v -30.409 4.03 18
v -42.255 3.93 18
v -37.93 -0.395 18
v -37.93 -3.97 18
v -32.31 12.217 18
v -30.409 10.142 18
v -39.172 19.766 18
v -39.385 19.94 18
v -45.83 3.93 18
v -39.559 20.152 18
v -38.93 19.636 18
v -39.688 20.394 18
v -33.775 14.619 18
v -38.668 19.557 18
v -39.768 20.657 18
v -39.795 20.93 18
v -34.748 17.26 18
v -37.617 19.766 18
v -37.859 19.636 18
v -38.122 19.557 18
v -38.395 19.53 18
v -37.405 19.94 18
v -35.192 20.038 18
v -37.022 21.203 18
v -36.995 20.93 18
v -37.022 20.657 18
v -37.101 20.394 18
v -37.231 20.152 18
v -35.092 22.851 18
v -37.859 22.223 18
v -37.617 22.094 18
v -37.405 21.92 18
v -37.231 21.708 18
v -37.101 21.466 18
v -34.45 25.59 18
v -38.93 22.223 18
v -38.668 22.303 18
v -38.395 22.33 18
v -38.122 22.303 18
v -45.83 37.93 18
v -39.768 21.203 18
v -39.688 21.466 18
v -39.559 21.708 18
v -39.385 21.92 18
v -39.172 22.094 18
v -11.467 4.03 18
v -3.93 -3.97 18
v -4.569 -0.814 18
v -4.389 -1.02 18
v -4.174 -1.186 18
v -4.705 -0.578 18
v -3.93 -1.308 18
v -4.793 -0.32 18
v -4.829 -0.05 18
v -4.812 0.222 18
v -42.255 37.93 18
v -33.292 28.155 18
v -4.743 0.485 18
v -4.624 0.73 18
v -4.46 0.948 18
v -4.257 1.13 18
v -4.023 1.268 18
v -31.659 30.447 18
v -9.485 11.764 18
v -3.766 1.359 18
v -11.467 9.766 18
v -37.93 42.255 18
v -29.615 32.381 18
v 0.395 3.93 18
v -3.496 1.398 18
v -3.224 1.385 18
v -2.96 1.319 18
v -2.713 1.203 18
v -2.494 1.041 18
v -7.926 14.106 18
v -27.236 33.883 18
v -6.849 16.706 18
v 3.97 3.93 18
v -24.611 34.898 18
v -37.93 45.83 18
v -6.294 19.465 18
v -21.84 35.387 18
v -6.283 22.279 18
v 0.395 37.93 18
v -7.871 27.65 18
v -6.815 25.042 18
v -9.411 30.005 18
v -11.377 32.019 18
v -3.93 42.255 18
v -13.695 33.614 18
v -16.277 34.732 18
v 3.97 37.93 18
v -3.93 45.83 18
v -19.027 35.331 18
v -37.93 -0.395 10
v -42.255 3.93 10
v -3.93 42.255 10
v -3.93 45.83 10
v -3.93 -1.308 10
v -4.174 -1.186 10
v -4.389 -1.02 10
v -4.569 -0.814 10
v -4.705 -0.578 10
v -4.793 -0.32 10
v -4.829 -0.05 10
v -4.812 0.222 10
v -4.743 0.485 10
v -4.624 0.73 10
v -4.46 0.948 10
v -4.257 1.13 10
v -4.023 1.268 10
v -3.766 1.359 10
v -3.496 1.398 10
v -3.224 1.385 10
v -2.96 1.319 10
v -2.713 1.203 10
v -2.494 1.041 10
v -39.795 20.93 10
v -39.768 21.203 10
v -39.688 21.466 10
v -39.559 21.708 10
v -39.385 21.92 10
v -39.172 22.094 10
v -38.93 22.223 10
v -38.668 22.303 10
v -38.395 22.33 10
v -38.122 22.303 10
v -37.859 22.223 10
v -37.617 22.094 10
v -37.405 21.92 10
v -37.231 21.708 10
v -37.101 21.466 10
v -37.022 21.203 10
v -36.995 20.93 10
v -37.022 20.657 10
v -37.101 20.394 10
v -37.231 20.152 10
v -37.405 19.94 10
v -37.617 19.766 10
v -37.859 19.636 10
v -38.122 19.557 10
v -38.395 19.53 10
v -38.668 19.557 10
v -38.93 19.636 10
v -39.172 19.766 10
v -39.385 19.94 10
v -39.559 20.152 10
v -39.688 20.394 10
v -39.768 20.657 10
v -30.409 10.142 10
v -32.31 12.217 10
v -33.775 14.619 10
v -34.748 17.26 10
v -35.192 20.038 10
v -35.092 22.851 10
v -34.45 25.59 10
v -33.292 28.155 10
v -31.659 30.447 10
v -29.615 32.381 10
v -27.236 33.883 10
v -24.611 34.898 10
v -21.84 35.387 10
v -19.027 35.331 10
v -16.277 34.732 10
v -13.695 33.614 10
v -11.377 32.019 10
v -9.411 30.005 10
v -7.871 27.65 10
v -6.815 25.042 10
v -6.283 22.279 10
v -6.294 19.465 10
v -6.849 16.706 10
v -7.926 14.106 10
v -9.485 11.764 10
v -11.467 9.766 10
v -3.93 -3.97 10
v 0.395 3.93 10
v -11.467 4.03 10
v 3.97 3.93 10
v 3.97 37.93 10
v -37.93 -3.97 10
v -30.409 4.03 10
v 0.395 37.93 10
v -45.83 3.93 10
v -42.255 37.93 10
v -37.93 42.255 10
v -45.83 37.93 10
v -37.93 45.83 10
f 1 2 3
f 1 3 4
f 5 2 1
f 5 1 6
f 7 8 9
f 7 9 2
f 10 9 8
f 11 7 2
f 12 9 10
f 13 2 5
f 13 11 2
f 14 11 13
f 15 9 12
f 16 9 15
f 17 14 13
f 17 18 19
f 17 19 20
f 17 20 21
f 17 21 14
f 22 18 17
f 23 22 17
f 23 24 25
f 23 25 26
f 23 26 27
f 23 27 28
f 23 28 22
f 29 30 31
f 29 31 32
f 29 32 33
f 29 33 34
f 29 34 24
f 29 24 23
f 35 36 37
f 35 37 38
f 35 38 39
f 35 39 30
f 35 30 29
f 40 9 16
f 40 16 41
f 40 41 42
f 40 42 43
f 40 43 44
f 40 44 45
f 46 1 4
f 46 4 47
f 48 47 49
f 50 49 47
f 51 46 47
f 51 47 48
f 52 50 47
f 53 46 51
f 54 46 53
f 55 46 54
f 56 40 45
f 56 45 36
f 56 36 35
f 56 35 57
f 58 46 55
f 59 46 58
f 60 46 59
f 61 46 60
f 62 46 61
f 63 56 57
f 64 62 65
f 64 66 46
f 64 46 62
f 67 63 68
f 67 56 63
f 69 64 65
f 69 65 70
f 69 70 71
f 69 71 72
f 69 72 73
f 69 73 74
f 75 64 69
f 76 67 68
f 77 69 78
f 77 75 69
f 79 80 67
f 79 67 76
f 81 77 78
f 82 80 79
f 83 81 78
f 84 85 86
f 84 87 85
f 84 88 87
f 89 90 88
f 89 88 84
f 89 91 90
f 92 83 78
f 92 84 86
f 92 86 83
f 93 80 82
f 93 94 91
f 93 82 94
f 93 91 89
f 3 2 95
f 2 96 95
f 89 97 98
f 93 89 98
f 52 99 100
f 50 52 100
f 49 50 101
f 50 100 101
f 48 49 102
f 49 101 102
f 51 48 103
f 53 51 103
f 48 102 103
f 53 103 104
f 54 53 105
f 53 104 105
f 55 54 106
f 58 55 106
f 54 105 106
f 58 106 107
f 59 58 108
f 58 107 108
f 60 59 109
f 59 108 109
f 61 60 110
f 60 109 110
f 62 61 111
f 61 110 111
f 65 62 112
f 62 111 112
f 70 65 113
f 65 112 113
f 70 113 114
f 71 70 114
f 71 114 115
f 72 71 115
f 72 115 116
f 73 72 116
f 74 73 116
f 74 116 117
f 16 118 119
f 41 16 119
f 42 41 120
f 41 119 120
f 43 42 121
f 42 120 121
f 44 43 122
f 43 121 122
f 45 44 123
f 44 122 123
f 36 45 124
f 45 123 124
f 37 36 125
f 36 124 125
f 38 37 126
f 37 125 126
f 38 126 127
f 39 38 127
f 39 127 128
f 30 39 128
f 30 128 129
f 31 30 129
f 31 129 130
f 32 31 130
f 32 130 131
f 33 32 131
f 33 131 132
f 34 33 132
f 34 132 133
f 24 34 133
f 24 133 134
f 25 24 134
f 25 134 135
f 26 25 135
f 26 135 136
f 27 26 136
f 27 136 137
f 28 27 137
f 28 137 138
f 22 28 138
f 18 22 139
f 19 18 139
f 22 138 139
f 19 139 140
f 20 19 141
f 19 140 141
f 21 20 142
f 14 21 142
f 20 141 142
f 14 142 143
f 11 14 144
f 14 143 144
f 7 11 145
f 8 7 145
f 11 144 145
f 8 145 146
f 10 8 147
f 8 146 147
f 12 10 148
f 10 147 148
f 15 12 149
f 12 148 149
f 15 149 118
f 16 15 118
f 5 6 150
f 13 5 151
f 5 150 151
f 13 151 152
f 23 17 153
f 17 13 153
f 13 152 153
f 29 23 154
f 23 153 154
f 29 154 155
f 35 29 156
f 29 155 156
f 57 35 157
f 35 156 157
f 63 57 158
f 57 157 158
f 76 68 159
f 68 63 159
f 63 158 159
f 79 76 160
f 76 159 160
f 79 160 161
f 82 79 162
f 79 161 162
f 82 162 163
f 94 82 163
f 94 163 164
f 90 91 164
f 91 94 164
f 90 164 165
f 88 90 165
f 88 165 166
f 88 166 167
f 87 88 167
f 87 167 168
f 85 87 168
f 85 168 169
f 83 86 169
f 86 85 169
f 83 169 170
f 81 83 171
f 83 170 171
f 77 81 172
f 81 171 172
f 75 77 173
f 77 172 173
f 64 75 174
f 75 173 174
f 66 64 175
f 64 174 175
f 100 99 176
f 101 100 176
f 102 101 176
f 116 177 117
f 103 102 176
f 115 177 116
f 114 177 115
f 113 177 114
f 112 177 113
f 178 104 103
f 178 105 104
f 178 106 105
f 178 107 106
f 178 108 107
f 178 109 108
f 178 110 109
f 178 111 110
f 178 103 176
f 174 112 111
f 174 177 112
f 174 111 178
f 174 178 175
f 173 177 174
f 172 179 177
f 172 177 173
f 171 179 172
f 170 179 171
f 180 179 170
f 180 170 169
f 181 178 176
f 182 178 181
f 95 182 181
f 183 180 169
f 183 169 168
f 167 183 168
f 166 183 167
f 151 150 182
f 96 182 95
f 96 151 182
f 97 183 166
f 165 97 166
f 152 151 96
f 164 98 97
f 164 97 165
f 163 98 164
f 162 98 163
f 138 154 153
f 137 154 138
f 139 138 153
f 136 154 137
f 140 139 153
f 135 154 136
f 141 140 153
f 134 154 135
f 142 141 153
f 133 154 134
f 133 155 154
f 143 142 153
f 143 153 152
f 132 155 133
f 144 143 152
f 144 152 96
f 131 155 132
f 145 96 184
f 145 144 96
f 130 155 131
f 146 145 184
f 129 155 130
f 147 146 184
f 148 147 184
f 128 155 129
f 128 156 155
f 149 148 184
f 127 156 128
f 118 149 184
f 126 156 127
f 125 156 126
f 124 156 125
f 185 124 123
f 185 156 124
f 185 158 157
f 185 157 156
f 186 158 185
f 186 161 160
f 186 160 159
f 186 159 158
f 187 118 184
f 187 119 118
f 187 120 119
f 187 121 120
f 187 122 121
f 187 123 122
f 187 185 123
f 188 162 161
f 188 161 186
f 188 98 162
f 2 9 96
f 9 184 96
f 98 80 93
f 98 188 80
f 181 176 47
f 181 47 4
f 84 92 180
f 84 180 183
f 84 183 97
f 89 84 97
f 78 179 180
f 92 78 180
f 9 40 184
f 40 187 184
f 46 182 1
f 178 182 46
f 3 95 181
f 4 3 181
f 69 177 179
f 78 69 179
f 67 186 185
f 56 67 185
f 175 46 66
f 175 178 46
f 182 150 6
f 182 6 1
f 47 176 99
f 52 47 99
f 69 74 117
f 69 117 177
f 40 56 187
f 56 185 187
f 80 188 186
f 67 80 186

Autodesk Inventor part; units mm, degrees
ref_plane "YZ Plane" through (0, 0, 0) normal (1, 0, 0) x (0, 1, 0)
ref_plane "XZ Plane" through (0, 0, 0) normal (0, 1, 0) x (-1, 0, 0)
ref_plane "Work Plane1" through (0, 0, 10) normal (0, 0, 1) x (1, 0, 0)
sketch "Sketch1" plane through (0, 0, 10) normal (0, 0, 1) x (1, 0, 0)
  line L0 (-4.0299, -0.3538) -> (-2.2322, 1.4439) construction
  arc A0 (-1.4439, 2.2322) -> (-2.2322, 1.4439) centre (-0.9299, 0.9299) ccw construction
  line L1 (-1.4439, 2.2322) -> (0.3538, 4.0299) construction
  line L2 (-37.8299, 42.2137) -> (-37.8299, 45.8299) construction
  line L3 (-37.8299, 45.8299) -> (-4.0299, 45.8299) construction
  line L4 (-4.0299, 45.8299) -> (-4.0299, 42.2137) construction
  line L5 (-4.0299, 4.0299) -> (0.3538, 4.0299) projected
  circle A1 centre (-20.9299, 20.9299) radius 17.5 construction
  line L6 (-20.9299, 58.9723) -> (17.1124, 20.9299) construction
  line L7 (17.1124, 20.9299) -> (-20.9299, -17.1124) construction
  line L8 (-20.9299, -17.1124) -> (-58.9723, 20.9299) construction
  line L9 (-58.9723, 20.9299) -> (-20.9299, 58.9723) construction
  line L10 (-20.9299, 58.9723) -> (-20.9299, -17.1124) construction
  line L11 (17.1124, 20.9299) -> (-58.9723, 20.9299) construction
  line L12 (-20.9299, 58.9723) -> (32.8701, 58.9723) construction
  line L13 (-43.2198, 43.4299) -> (1.7802, 43.4299) construction
  line L14 (1.7802, 43.4299) -> (1.7802, -1.5701) construction
  line L15 (1.7802, -1.5701) -> (-43.2198, -1.5701) construction
  line L16 (-43.2198, -1.5701) -> (-43.2198, 43.4299) construction
  line L17 (-43.2198, 5.1774) -> (-43.2198, 36.6824)
  line L18 (-43.2198, 36.6824) -> (-36.4723, 43.4299)
  line L19 (-36.4723, 43.4299) -> (-5.3876, 43.4299)
  line L20 (-5.3876, 43.4299) -> (1.7802, 36.2621)
  line L21 (1.7802, 36.2621) -> (1.7802, 5.5977)
  line L22 (1.7802, 5.5977) -> (-5.3876, -1.5701)
  line L23 (-5.3876, -1.5701) -> (-36.4723, -1.5701)
  line L24 (-36.4723, -1.5701) -> (-43.2198, 5.1774)
  line L25 (-4.0299, 42.2137) -> (-37.8299, 42.2137) projected
  line L26 (-4.0299, -0.3538) -> (-4.0299, 4.0299) projected
  circle A2 centre (-20.7198, 20.9299) radius 7.0417 construction
  arc A3 (-7.3745, 3.5) -> (-34.4854, 3.5) centre (-20.9299, 0) ccw construction
  arc A4 (-11.4668, 9.7661) -> (-30.4087, 10.1422) centre (-20.7198, 20.9299) ccw
  line L27 (-30.5806, 10.1422) -> (-30.4087, 10.1422)
  line L28 (-30.4087, 10.1422) -> (-30.4087, 1.6029)
  line L29 (-30.4087, 1.6029) -> (-11.4668, 1.6029)
  line L30 (-11.4668, 1.6029) -> (-11.4668, 9.7661)
  line L31 (-43.2198, 43.4299) -> (-10.4667, 10.6769) construction
  line L32 (-8.5595, 8.5517) -> (1.7802, -1.5701) construction
  line L33 (1.7802, 43.4299) -> (-25.699, 15.9507) construction
  line L34 (-30.9728, 10.6769) -> (-43.2198, -1.5701) construction
  point P0 (-37.8299, 4.0299)
  dimension "d18" = 53.8
  dimension "d19" = 45
  dimension "d20" = 53.8
  dimension "d21" = 45
  dimension "d22" = 45
  dimension "d68" = 29
extrude "Extrusion1" add sketch "Sketch1" along normal blind 8
sketch "Sketch3" plane through (0, 0, 10) normal (0, 0, -1) x (-1, 0, 0)
  line L0 (37.8299, -0.4701) -> (37.8299, 4.0299) construction
  line L1 (4.0299, 4.0299) -> (4.0299, -0.4701) construction
  line L2 (37.8299, -0.4701) -> (37.8299, 1.1886) construction
  line L3 (4.0299, -3.9701) -> (4.0299, -0.3538) construction
  line L4 (45.8299, 4.0299) -> (42.2137, 4.0299) construction
  line L5 (-0.3538, 4.0299) -> (-3.9701, 4.0299) construction
  line L6 (-3.9701, 37.8299) -> (-0.3538, 37.8299) construction
  line L7 (4.0299, 42.2137) -> (4.0299, 45.8299) construction
  line L8 (37.8299, 45.8299) -> (37.8299, 42.2137) construction
  line L9 (42.2137, 37.8299) -> (45.8299, 37.8299) construction
  line L10 (37.8299, 37.7299) -> (45.8299, 37.7299)
  line L11 (45.8299, 37.7299) -> (45.8299, 4.1299)
  line L12 (45.8299, 4.1299) -> (37.8299, 4.1299)
  line L13 (37.8299, 4.1299) -> (37.8299, 37.7299)
  line L14 (37.7299, 4.0299) -> (4.1299, 4.0299)
  line L15 (4.1299, 4.0299) -> (4.1299, -3.9701)
  line L16 (4.1299, -3.9701) -> (37.7299, -3.9701)
  line L17 (37.7299, -3.9701) -> (37.7299, 4.0299)
  line L18 (4.0299, 4.1299) -> (-3.9701, 4.1299)
  line L19 (-3.9701, 4.1299) -> (-3.9701, 37.7299)
  line L20 (-3.9701, 37.7299) -> (4.0299, 37.7299)
  line L21 (4.0299, 37.7299) -> (4.0299, 4.1299)
  line L22 (4.1299, 37.8299) -> (37.7299, 37.8299)
  line L23 (37.7299, 37.8299) -> (37.7299, 45.8299)
  line L24 (37.7299, 45.8299) -> (4.1299, 45.8299)
  line L25 (4.1299, 45.8299) -> (4.1299, 37.8299)
  point P0 (0, 0)
  dimension "d23" = 0.1
  dimension "d24" = 0.1
  dimension "d25" = 0.1
  dimension "d26" = 0.1
  dimension "d27" = 0.1
extrude "Extrusion3" add sketch "Sketch3" against normal up to surface (8 mm away)
sketch "Skizze12" plane through (0, 0, 10) normal (0, 0, -1) x (-1, 0, 0)
  line L0 (-0.3124, 4.1299) -> (4.1299, -0.3124) projected
  line L1 (4.1299, -0.3124) -> (4.1299, -3.9701) projected
  line L2 (4.1299, -3.9701) -> (37.7299, -3.9701) construction
  line L3 (37.7299, -3.9701) -> (37.7299, -0.3124) projected
  line L4 (37.7299, -0.3124) -> (42.1723, 4.1299) projected
  line L5 (45.8299, 4.1299) -> (42.1723, 4.1299) projected
  line L6 (45.8299, 37.7299) -> (45.8299, 4.1299) construction
  line L7 (42.1723, 37.7299) -> (45.8299, 37.7299) projected
  line L8 (42.1723, 37.7299) -> (37.7299, 42.1723) projected
  line L9 (37.7299, 42.1723) -> (37.7299, 45.8299) projected
  line L10 (37.7299, 45.8299) -> (4.1299, 45.8299) construction
  line L11 (4.1299, 45.8299) -> (4.1299, 42.1723) projected
  line L12 (4.1299, 42.1723) -> (-0.3124, 37.7299) projected
  line L13 (-3.9701, 37.7299) -> (-0.3124, 37.7299) projected
  line L14 (-3.9701, 4.1299) -> (-3.9701, 37.7299) construction
  line L15 (-0.3124, 4.1299) -> (-3.9701, 4.1299) projected
  line L16 (37.9299, -4.1701) -> (3.9299, -4.1701) construction
  line L17 (3.9299, -4.1701) -> (3.9299, -0.3953)
  line L18 (3.9299, -0.3953) -> (-0.3953, 3.9299)
  line L19 (-0.3953, 3.9299) -> (-4.1701, 3.9299)
  line L20 (-4.1701, 3.9299) -> (-4.1701, 37.9299) construction
  line L21 (-4.1701, 37.9299) -> (-0.3953, 37.9299)
  line L22 (-0.3953, 37.9299) -> (3.9299, 42.2551)
  line L23 (3.9299, 42.2551) -> (3.9299, 46.0299)
  line L24 (3.9299, 46.0299) -> (37.9299, 46.0299) construction
  line L25 (37.9299, 46.0299) -> (37.9299, 42.2551)
  line L26 (37.9299, 42.2551) -> (42.2551, 37.9299)
  line L27 (42.2551, 37.9299) -> (46.0299, 37.9299)
  line L28 (46.0299, 37.9299) -> (46.0299, 3.9299) construction
  line L29 (46.0299, 3.9299) -> (42.2551, 3.9299)
  line L30 (42.2551, 3.9299) -> (37.9299, -0.3953)
  line L31 (37.9299, -0.3953) -> (37.9299, -4.1701)
  line L32 (-3.9701, 37.7299) -> (-3.9701, 37.9299)
  line L33 (37.7299, 45.8299) -> (4.1299, 45.8299) projected
  line L34 (4.1299, 45.8299) -> (3.9299, 45.8299)
  line L35 (37.7299, 45.8299) -> (37.9299, 45.8299)
  line L36 (45.8299, 37.7299) -> (45.8299, 37.9299)
  line L37 (45.8299, 4.1299) -> (45.8299, 3.9299)
  line L38 (37.7299, -3.9701) -> (37.9299, -3.9701)
  line L39 (4.1299, -3.9701) -> (3.9299, -3.9701)
  line L40 (-3.9701, 4.1299) -> (-3.9701, 3.9299)
  point P0 (0, 0)
  dimension "d65" = 0.2
extrude "IM_offset" add sketch "Skizze12" against normal up to surface (8 mm away)
sketch "Sketch14" plane through (0, 0, 10) normal (0, 0, -1) x (-1, 0, 0)
  arc A0 (5.5299, 0) -> (1.3299, 0) centre (3.4299, 0) ccw projected
  line L0 (37.8999, 16.97) -> (37.8999, -16.97) projected
  circle A1 centre (38.3947, 20.9299) radius 1.4
  circle A2 centre (3.4299, 0) radius 1.4
  point P0 (0, 0)
  dimension "d69" = 2.8
  dimension "d70" = 2.8
extrude "Extrusion12" cut sketch "Sketch14" against normal blind 10
properties part number "20_Cube_Insert_RaspiCam_v3"
